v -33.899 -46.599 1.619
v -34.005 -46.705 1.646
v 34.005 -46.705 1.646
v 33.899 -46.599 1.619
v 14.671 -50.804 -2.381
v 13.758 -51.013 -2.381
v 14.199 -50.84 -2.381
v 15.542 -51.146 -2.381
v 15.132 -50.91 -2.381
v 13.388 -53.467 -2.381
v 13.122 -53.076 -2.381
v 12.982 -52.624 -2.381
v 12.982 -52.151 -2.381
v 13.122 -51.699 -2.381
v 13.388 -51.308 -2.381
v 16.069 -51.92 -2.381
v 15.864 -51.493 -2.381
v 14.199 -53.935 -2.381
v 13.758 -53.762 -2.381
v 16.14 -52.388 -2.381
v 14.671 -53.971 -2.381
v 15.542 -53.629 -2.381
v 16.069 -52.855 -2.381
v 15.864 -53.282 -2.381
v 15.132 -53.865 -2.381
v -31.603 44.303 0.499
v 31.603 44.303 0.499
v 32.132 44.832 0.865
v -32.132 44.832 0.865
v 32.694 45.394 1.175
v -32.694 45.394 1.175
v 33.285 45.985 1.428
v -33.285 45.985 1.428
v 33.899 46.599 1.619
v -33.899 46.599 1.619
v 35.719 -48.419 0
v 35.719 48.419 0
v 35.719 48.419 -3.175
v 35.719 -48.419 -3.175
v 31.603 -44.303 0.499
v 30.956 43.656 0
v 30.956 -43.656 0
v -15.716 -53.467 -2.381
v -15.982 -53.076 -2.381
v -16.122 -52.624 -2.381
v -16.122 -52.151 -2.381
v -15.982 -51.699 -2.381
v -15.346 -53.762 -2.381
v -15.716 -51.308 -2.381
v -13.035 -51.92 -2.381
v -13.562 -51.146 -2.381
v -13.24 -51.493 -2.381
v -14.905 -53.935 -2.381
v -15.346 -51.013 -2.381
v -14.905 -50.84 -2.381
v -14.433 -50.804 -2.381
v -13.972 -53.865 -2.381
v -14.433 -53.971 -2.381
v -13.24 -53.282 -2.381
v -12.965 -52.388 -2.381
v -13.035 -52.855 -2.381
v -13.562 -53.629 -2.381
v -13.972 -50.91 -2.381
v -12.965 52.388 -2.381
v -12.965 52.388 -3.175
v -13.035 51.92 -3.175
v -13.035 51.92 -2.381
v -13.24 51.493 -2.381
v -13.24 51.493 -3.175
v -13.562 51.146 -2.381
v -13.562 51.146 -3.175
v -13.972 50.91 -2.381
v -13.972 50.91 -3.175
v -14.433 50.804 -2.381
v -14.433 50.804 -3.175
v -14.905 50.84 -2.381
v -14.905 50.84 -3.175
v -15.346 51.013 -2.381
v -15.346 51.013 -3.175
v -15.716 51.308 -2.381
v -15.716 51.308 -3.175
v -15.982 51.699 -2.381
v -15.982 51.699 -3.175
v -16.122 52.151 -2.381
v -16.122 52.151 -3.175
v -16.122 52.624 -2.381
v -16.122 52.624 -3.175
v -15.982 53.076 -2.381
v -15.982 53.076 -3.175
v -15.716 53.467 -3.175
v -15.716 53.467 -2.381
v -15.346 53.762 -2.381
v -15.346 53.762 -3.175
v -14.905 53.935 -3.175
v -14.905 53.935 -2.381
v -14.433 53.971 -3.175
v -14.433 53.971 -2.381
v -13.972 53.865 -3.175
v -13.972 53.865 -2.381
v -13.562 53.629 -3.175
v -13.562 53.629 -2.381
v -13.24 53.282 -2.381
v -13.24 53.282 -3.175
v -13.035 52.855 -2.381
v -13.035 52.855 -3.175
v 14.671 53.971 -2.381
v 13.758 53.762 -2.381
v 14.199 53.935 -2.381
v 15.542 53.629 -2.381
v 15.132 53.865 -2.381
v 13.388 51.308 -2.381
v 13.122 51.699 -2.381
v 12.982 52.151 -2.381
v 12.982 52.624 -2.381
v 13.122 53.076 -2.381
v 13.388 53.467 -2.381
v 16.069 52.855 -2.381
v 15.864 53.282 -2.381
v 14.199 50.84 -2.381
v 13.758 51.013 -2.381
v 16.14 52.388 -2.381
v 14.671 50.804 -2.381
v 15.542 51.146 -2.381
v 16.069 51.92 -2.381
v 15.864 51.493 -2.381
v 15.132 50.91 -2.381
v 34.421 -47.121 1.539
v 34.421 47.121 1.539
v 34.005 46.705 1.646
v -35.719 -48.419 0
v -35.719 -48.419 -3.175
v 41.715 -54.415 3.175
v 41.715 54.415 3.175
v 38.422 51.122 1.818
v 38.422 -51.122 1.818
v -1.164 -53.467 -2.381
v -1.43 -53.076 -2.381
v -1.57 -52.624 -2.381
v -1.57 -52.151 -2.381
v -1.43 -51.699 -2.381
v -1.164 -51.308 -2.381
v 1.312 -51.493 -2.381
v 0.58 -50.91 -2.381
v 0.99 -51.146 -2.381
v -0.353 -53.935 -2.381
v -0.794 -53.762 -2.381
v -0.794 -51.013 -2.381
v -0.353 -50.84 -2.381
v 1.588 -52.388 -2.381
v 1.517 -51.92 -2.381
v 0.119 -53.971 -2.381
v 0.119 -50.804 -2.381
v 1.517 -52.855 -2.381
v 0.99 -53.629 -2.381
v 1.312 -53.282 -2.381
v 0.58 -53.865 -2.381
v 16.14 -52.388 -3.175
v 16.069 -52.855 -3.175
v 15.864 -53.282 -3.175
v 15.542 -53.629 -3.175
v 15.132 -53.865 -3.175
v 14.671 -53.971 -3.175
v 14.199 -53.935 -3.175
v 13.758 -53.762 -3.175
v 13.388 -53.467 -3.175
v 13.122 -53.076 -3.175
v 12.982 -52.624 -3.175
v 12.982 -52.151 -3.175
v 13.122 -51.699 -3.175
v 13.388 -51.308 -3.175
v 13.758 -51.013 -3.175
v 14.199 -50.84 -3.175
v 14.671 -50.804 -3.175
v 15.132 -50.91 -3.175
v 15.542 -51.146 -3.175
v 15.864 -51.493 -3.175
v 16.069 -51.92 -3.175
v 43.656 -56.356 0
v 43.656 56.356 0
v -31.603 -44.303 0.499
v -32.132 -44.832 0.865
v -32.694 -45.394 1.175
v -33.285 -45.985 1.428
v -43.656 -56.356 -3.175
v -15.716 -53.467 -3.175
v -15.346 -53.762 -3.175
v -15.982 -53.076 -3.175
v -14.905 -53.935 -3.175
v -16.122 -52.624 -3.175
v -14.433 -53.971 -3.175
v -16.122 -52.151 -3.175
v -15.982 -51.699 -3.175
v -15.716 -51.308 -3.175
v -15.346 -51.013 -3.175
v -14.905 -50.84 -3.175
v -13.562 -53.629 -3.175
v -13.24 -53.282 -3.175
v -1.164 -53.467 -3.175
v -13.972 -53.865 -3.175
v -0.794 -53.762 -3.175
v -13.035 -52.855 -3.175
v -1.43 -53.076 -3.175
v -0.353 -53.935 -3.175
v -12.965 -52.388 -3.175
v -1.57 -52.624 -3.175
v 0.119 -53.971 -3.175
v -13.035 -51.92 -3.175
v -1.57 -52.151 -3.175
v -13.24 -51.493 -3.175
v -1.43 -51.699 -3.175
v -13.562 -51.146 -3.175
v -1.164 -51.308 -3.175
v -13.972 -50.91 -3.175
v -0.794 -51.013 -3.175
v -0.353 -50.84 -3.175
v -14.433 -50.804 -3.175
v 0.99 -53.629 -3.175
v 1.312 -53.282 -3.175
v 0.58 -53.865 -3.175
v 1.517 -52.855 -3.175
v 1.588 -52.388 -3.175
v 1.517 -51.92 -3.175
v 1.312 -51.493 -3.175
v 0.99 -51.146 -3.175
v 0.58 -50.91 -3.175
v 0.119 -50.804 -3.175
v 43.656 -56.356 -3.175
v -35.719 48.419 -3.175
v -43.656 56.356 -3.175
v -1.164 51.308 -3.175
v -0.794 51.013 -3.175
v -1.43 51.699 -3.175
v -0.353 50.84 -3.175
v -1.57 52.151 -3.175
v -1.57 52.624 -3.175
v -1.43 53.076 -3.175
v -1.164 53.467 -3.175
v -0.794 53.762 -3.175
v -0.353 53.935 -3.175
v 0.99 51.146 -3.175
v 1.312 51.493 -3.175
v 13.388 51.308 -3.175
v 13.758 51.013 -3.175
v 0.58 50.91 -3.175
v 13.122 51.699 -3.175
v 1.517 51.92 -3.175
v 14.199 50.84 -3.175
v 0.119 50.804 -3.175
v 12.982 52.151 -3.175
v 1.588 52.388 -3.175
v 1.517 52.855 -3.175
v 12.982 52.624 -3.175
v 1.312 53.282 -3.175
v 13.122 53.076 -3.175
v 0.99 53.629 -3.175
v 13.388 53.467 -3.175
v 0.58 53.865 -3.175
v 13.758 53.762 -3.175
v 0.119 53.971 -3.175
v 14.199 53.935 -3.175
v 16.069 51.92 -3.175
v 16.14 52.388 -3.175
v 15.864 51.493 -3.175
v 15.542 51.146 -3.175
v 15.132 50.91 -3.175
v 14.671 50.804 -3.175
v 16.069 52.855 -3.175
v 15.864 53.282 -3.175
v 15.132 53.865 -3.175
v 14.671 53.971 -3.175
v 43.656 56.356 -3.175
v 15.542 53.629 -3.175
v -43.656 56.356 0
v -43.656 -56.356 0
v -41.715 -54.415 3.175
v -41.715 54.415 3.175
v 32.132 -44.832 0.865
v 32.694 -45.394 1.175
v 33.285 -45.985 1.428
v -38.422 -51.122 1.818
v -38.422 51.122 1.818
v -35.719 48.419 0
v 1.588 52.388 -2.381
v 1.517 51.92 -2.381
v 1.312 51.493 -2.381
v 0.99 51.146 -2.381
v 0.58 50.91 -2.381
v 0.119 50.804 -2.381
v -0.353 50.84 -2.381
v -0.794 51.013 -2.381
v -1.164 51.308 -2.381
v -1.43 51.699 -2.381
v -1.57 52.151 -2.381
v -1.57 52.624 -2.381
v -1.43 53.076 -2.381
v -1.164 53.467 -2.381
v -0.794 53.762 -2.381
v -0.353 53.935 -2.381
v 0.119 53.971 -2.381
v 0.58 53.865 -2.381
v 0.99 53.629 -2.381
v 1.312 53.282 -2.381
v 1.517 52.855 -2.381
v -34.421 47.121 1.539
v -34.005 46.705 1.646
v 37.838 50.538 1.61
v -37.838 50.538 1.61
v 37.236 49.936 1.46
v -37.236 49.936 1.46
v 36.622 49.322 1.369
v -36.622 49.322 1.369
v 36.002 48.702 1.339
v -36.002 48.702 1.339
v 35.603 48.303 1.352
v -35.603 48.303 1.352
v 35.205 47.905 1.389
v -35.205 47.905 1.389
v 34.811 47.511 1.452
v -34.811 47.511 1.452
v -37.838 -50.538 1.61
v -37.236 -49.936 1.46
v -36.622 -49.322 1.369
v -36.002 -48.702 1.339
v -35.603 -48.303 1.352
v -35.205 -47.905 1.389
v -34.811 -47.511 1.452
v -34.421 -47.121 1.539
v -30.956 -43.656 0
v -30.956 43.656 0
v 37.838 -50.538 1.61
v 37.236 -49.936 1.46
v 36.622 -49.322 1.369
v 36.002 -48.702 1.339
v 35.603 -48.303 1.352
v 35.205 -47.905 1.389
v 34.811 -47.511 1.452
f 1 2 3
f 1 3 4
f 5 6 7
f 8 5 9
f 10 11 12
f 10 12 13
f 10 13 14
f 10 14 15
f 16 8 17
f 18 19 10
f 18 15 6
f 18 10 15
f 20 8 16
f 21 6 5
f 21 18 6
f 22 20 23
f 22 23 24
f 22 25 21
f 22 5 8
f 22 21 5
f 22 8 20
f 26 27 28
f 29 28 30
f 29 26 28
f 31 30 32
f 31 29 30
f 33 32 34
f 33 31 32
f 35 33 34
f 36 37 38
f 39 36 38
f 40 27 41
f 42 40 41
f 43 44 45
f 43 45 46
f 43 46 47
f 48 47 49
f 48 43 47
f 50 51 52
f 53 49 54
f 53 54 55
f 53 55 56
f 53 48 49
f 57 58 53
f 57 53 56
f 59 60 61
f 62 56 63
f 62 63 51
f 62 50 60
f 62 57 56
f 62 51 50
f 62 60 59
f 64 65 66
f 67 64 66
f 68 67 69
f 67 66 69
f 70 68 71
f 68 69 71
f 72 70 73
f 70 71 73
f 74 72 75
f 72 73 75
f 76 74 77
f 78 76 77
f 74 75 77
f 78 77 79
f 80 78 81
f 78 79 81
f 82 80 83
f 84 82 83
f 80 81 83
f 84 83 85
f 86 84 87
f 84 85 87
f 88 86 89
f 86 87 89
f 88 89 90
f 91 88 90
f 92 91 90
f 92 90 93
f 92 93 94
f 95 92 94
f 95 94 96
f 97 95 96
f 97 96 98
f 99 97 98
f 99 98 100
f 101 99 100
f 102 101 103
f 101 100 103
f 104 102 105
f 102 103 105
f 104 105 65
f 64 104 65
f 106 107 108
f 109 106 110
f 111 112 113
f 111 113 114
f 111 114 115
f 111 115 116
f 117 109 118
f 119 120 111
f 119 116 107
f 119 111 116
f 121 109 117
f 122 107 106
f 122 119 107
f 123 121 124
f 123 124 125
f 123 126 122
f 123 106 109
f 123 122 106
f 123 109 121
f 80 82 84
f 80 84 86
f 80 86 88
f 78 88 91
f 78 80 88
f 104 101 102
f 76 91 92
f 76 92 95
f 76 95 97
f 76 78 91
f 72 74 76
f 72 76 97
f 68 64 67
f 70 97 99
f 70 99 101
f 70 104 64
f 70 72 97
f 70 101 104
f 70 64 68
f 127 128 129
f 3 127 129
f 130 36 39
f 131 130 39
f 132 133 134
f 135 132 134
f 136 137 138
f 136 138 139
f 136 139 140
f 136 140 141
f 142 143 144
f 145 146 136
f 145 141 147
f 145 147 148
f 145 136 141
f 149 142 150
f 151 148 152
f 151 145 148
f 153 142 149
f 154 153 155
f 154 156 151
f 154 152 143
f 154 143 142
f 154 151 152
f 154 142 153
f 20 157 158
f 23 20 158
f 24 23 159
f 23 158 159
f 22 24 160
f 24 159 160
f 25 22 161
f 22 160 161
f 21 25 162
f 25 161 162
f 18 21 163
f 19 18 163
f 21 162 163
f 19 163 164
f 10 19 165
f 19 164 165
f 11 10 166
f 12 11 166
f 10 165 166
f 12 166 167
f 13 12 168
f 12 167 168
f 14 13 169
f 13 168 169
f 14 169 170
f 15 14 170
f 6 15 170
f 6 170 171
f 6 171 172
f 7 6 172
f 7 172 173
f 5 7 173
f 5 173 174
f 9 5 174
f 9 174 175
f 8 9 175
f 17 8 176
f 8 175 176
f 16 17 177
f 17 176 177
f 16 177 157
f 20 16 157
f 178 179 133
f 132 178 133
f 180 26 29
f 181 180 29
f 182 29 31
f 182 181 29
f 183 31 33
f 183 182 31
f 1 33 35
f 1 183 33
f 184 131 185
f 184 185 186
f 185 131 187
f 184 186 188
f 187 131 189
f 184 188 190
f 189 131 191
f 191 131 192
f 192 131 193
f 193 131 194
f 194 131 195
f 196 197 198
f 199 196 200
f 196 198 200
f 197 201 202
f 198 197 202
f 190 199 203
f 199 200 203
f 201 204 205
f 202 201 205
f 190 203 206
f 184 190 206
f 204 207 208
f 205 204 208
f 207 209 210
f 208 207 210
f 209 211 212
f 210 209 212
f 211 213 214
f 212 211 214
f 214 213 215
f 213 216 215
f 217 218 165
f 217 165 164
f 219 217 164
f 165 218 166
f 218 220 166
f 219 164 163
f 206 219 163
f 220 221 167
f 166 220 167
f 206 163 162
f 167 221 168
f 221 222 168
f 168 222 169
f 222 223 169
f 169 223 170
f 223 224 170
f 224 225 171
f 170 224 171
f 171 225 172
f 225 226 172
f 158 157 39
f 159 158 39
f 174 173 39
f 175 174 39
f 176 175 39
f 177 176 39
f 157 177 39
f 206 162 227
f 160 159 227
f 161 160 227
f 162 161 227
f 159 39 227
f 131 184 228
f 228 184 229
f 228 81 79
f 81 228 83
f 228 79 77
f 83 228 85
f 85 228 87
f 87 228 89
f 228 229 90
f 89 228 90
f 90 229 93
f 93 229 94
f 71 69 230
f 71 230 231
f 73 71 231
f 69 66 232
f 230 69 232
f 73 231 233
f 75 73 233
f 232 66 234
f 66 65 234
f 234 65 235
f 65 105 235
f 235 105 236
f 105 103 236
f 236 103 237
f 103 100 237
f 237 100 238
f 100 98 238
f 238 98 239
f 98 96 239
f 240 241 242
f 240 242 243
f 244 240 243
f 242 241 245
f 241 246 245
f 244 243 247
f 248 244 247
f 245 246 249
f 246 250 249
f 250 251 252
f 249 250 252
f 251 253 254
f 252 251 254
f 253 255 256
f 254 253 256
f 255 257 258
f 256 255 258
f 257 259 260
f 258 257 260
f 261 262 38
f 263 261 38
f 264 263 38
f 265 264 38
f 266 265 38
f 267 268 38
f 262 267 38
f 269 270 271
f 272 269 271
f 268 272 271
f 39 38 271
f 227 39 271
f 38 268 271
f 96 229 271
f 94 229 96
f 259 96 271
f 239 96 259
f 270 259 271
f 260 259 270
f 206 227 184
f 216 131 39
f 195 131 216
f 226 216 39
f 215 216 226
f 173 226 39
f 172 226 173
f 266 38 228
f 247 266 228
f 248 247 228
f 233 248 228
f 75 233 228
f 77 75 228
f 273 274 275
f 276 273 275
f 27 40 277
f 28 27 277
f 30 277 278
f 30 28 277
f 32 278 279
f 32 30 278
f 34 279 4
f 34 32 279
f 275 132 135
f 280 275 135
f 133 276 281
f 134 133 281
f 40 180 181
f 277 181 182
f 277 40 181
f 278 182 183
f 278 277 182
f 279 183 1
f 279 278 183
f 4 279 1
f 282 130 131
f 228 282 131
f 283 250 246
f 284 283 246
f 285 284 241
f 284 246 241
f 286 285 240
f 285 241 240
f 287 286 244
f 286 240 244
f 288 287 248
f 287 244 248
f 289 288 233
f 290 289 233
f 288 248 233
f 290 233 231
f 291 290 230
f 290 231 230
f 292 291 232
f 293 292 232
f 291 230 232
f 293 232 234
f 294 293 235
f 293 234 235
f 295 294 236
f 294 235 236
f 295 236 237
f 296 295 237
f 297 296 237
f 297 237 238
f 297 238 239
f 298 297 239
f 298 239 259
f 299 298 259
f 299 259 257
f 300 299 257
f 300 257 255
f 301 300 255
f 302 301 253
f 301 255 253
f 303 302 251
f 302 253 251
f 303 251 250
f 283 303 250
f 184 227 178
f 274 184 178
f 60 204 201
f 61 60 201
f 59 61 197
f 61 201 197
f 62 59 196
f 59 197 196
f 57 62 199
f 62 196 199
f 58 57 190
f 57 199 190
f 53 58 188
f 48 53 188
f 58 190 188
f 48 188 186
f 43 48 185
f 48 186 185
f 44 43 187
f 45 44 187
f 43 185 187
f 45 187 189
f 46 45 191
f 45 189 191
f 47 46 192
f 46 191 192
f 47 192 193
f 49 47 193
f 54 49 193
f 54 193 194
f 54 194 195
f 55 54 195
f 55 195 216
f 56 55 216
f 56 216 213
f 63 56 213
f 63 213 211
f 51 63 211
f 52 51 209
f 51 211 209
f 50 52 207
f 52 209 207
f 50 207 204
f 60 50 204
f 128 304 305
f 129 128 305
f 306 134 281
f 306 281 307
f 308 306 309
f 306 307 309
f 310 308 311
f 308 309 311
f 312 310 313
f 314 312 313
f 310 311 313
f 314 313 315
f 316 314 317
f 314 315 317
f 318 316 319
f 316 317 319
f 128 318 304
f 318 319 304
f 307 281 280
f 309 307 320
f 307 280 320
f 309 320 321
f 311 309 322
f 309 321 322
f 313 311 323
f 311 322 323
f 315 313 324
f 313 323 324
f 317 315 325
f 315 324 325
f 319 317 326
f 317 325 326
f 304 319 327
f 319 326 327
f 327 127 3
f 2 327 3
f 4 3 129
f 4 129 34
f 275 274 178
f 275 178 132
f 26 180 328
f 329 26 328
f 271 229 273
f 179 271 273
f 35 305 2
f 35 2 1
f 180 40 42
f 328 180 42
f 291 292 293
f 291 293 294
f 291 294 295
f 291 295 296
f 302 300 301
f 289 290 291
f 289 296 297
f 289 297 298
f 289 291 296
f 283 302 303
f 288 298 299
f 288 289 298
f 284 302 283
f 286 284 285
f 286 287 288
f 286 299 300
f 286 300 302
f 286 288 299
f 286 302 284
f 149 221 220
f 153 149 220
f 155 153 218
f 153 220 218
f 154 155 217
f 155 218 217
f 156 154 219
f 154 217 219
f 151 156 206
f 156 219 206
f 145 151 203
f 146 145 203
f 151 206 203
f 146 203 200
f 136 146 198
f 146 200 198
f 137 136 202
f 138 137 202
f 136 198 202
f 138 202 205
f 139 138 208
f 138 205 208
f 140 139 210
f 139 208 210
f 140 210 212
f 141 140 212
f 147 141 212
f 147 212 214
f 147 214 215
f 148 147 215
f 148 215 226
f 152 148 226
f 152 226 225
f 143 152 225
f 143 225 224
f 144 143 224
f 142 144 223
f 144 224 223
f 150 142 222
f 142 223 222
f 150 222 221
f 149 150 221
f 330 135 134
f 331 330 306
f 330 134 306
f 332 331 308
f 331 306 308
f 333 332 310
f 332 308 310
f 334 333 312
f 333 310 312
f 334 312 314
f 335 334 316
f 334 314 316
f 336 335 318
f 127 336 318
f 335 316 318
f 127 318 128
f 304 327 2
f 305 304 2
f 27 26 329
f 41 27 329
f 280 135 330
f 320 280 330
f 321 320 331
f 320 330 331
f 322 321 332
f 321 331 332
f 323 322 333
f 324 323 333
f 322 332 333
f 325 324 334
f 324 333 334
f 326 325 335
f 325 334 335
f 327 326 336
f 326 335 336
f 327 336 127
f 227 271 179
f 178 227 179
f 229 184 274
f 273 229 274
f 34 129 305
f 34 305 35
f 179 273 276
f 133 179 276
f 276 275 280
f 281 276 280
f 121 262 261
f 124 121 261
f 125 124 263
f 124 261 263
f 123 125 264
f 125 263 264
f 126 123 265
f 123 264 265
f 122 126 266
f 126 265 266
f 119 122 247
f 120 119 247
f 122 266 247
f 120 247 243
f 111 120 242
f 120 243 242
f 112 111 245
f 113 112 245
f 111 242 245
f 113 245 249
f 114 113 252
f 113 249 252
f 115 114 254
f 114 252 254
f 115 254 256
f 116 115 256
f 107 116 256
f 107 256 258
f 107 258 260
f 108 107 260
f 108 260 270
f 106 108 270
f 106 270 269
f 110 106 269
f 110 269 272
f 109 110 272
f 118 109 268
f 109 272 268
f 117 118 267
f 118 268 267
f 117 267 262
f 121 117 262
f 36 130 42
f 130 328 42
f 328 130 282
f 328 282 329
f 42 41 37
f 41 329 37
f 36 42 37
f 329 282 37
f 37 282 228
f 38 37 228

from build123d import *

# Parameters (mm, degrees)
F4_R     = 1.5875
F5_DEPTH = 0.79375


# Not quite as in the source:
# - a length typed as a fraction of an inch, garbled in the dataset ("3 / 203.2 mm" for 3/8 in), is restored


with BuildPart() as f2:
    # F2: sweep along a path in F0
    with BuildLine(Plane.XY) as f2_path:
        Line((35.71875, -48.41875), (35.71875, 48.41875))
        Line((35.71875, 48.41875), (-35.71875, 48.41875))
        Line((-35.71875, 48.41875), (-35.71875, -48.41875))
        Line((-35.71875, -48.41875), (35.71875, -48.41875))
    # F1 (on Front) → F2 (sweep)
    with BuildSketch(Plane.XZ):
        with BuildLine():
            Line((31.6033883161, 0.4986022927), (30.95625, 0))
            Line((30.95625, 0), (35.71875, 0))
            Line((35.71875, 0), (35.71875, -3.175))
            Line((35.71875, -3.175), (43.65625, -3.175))
            Line((43.65625, -3.175), (43.65625, 0))
            Line((43.65625, 0), (41.7148061097, 3.175))
            Line((41.7148061097, 3.175), (38.4218543283, 1.8180225684))
            ThreePointArc((38.4218543283, 1.8180225684), (36.4440586883, 1.3544374061), (34.4210724061, 1.5391352618))
            Line((34.4210724061, 1.5391352618), (34.0052636218, 1.6460575328))
            Line((34.0052636218, 1.6460575328), (33.899012953, 1.618762617))
            ThreePointArc((33.899012953, 1.618762617), (32.6942949799, 1.1753032814), (31.6033883161, 0.4986022927))
        make_face()
    sweep(path=f2_path.line, transition=Transition.RIGHT)

    # F4 (on face) → F5 (cut)
    with BuildSketch(Plane(origin=(0, 0, -3.175), x_dir=(1, 0, 0), z_dir=(0, 0, -1))):
        with Locations((-14.5520833333, 52.3875)):
            Circle(F4_R)
        with Locations((0, 52.3875)):
            Circle(F4_R)
        with Locations((14.5520833333, 52.3875)):
            Circle(F4_R)
        with Locations((-14.5520833333, -52.3875)):
            Circle(F4_R)
        with Locations((0, -52.3875)):
            Circle(F4_R)
        with Locations((14.5520833333, -52.3875)):
            Circle(F4_R)
    extrude(amount=-F5_DEPTH, mode=Mode.SUBTRACT)


solid = f2.part
